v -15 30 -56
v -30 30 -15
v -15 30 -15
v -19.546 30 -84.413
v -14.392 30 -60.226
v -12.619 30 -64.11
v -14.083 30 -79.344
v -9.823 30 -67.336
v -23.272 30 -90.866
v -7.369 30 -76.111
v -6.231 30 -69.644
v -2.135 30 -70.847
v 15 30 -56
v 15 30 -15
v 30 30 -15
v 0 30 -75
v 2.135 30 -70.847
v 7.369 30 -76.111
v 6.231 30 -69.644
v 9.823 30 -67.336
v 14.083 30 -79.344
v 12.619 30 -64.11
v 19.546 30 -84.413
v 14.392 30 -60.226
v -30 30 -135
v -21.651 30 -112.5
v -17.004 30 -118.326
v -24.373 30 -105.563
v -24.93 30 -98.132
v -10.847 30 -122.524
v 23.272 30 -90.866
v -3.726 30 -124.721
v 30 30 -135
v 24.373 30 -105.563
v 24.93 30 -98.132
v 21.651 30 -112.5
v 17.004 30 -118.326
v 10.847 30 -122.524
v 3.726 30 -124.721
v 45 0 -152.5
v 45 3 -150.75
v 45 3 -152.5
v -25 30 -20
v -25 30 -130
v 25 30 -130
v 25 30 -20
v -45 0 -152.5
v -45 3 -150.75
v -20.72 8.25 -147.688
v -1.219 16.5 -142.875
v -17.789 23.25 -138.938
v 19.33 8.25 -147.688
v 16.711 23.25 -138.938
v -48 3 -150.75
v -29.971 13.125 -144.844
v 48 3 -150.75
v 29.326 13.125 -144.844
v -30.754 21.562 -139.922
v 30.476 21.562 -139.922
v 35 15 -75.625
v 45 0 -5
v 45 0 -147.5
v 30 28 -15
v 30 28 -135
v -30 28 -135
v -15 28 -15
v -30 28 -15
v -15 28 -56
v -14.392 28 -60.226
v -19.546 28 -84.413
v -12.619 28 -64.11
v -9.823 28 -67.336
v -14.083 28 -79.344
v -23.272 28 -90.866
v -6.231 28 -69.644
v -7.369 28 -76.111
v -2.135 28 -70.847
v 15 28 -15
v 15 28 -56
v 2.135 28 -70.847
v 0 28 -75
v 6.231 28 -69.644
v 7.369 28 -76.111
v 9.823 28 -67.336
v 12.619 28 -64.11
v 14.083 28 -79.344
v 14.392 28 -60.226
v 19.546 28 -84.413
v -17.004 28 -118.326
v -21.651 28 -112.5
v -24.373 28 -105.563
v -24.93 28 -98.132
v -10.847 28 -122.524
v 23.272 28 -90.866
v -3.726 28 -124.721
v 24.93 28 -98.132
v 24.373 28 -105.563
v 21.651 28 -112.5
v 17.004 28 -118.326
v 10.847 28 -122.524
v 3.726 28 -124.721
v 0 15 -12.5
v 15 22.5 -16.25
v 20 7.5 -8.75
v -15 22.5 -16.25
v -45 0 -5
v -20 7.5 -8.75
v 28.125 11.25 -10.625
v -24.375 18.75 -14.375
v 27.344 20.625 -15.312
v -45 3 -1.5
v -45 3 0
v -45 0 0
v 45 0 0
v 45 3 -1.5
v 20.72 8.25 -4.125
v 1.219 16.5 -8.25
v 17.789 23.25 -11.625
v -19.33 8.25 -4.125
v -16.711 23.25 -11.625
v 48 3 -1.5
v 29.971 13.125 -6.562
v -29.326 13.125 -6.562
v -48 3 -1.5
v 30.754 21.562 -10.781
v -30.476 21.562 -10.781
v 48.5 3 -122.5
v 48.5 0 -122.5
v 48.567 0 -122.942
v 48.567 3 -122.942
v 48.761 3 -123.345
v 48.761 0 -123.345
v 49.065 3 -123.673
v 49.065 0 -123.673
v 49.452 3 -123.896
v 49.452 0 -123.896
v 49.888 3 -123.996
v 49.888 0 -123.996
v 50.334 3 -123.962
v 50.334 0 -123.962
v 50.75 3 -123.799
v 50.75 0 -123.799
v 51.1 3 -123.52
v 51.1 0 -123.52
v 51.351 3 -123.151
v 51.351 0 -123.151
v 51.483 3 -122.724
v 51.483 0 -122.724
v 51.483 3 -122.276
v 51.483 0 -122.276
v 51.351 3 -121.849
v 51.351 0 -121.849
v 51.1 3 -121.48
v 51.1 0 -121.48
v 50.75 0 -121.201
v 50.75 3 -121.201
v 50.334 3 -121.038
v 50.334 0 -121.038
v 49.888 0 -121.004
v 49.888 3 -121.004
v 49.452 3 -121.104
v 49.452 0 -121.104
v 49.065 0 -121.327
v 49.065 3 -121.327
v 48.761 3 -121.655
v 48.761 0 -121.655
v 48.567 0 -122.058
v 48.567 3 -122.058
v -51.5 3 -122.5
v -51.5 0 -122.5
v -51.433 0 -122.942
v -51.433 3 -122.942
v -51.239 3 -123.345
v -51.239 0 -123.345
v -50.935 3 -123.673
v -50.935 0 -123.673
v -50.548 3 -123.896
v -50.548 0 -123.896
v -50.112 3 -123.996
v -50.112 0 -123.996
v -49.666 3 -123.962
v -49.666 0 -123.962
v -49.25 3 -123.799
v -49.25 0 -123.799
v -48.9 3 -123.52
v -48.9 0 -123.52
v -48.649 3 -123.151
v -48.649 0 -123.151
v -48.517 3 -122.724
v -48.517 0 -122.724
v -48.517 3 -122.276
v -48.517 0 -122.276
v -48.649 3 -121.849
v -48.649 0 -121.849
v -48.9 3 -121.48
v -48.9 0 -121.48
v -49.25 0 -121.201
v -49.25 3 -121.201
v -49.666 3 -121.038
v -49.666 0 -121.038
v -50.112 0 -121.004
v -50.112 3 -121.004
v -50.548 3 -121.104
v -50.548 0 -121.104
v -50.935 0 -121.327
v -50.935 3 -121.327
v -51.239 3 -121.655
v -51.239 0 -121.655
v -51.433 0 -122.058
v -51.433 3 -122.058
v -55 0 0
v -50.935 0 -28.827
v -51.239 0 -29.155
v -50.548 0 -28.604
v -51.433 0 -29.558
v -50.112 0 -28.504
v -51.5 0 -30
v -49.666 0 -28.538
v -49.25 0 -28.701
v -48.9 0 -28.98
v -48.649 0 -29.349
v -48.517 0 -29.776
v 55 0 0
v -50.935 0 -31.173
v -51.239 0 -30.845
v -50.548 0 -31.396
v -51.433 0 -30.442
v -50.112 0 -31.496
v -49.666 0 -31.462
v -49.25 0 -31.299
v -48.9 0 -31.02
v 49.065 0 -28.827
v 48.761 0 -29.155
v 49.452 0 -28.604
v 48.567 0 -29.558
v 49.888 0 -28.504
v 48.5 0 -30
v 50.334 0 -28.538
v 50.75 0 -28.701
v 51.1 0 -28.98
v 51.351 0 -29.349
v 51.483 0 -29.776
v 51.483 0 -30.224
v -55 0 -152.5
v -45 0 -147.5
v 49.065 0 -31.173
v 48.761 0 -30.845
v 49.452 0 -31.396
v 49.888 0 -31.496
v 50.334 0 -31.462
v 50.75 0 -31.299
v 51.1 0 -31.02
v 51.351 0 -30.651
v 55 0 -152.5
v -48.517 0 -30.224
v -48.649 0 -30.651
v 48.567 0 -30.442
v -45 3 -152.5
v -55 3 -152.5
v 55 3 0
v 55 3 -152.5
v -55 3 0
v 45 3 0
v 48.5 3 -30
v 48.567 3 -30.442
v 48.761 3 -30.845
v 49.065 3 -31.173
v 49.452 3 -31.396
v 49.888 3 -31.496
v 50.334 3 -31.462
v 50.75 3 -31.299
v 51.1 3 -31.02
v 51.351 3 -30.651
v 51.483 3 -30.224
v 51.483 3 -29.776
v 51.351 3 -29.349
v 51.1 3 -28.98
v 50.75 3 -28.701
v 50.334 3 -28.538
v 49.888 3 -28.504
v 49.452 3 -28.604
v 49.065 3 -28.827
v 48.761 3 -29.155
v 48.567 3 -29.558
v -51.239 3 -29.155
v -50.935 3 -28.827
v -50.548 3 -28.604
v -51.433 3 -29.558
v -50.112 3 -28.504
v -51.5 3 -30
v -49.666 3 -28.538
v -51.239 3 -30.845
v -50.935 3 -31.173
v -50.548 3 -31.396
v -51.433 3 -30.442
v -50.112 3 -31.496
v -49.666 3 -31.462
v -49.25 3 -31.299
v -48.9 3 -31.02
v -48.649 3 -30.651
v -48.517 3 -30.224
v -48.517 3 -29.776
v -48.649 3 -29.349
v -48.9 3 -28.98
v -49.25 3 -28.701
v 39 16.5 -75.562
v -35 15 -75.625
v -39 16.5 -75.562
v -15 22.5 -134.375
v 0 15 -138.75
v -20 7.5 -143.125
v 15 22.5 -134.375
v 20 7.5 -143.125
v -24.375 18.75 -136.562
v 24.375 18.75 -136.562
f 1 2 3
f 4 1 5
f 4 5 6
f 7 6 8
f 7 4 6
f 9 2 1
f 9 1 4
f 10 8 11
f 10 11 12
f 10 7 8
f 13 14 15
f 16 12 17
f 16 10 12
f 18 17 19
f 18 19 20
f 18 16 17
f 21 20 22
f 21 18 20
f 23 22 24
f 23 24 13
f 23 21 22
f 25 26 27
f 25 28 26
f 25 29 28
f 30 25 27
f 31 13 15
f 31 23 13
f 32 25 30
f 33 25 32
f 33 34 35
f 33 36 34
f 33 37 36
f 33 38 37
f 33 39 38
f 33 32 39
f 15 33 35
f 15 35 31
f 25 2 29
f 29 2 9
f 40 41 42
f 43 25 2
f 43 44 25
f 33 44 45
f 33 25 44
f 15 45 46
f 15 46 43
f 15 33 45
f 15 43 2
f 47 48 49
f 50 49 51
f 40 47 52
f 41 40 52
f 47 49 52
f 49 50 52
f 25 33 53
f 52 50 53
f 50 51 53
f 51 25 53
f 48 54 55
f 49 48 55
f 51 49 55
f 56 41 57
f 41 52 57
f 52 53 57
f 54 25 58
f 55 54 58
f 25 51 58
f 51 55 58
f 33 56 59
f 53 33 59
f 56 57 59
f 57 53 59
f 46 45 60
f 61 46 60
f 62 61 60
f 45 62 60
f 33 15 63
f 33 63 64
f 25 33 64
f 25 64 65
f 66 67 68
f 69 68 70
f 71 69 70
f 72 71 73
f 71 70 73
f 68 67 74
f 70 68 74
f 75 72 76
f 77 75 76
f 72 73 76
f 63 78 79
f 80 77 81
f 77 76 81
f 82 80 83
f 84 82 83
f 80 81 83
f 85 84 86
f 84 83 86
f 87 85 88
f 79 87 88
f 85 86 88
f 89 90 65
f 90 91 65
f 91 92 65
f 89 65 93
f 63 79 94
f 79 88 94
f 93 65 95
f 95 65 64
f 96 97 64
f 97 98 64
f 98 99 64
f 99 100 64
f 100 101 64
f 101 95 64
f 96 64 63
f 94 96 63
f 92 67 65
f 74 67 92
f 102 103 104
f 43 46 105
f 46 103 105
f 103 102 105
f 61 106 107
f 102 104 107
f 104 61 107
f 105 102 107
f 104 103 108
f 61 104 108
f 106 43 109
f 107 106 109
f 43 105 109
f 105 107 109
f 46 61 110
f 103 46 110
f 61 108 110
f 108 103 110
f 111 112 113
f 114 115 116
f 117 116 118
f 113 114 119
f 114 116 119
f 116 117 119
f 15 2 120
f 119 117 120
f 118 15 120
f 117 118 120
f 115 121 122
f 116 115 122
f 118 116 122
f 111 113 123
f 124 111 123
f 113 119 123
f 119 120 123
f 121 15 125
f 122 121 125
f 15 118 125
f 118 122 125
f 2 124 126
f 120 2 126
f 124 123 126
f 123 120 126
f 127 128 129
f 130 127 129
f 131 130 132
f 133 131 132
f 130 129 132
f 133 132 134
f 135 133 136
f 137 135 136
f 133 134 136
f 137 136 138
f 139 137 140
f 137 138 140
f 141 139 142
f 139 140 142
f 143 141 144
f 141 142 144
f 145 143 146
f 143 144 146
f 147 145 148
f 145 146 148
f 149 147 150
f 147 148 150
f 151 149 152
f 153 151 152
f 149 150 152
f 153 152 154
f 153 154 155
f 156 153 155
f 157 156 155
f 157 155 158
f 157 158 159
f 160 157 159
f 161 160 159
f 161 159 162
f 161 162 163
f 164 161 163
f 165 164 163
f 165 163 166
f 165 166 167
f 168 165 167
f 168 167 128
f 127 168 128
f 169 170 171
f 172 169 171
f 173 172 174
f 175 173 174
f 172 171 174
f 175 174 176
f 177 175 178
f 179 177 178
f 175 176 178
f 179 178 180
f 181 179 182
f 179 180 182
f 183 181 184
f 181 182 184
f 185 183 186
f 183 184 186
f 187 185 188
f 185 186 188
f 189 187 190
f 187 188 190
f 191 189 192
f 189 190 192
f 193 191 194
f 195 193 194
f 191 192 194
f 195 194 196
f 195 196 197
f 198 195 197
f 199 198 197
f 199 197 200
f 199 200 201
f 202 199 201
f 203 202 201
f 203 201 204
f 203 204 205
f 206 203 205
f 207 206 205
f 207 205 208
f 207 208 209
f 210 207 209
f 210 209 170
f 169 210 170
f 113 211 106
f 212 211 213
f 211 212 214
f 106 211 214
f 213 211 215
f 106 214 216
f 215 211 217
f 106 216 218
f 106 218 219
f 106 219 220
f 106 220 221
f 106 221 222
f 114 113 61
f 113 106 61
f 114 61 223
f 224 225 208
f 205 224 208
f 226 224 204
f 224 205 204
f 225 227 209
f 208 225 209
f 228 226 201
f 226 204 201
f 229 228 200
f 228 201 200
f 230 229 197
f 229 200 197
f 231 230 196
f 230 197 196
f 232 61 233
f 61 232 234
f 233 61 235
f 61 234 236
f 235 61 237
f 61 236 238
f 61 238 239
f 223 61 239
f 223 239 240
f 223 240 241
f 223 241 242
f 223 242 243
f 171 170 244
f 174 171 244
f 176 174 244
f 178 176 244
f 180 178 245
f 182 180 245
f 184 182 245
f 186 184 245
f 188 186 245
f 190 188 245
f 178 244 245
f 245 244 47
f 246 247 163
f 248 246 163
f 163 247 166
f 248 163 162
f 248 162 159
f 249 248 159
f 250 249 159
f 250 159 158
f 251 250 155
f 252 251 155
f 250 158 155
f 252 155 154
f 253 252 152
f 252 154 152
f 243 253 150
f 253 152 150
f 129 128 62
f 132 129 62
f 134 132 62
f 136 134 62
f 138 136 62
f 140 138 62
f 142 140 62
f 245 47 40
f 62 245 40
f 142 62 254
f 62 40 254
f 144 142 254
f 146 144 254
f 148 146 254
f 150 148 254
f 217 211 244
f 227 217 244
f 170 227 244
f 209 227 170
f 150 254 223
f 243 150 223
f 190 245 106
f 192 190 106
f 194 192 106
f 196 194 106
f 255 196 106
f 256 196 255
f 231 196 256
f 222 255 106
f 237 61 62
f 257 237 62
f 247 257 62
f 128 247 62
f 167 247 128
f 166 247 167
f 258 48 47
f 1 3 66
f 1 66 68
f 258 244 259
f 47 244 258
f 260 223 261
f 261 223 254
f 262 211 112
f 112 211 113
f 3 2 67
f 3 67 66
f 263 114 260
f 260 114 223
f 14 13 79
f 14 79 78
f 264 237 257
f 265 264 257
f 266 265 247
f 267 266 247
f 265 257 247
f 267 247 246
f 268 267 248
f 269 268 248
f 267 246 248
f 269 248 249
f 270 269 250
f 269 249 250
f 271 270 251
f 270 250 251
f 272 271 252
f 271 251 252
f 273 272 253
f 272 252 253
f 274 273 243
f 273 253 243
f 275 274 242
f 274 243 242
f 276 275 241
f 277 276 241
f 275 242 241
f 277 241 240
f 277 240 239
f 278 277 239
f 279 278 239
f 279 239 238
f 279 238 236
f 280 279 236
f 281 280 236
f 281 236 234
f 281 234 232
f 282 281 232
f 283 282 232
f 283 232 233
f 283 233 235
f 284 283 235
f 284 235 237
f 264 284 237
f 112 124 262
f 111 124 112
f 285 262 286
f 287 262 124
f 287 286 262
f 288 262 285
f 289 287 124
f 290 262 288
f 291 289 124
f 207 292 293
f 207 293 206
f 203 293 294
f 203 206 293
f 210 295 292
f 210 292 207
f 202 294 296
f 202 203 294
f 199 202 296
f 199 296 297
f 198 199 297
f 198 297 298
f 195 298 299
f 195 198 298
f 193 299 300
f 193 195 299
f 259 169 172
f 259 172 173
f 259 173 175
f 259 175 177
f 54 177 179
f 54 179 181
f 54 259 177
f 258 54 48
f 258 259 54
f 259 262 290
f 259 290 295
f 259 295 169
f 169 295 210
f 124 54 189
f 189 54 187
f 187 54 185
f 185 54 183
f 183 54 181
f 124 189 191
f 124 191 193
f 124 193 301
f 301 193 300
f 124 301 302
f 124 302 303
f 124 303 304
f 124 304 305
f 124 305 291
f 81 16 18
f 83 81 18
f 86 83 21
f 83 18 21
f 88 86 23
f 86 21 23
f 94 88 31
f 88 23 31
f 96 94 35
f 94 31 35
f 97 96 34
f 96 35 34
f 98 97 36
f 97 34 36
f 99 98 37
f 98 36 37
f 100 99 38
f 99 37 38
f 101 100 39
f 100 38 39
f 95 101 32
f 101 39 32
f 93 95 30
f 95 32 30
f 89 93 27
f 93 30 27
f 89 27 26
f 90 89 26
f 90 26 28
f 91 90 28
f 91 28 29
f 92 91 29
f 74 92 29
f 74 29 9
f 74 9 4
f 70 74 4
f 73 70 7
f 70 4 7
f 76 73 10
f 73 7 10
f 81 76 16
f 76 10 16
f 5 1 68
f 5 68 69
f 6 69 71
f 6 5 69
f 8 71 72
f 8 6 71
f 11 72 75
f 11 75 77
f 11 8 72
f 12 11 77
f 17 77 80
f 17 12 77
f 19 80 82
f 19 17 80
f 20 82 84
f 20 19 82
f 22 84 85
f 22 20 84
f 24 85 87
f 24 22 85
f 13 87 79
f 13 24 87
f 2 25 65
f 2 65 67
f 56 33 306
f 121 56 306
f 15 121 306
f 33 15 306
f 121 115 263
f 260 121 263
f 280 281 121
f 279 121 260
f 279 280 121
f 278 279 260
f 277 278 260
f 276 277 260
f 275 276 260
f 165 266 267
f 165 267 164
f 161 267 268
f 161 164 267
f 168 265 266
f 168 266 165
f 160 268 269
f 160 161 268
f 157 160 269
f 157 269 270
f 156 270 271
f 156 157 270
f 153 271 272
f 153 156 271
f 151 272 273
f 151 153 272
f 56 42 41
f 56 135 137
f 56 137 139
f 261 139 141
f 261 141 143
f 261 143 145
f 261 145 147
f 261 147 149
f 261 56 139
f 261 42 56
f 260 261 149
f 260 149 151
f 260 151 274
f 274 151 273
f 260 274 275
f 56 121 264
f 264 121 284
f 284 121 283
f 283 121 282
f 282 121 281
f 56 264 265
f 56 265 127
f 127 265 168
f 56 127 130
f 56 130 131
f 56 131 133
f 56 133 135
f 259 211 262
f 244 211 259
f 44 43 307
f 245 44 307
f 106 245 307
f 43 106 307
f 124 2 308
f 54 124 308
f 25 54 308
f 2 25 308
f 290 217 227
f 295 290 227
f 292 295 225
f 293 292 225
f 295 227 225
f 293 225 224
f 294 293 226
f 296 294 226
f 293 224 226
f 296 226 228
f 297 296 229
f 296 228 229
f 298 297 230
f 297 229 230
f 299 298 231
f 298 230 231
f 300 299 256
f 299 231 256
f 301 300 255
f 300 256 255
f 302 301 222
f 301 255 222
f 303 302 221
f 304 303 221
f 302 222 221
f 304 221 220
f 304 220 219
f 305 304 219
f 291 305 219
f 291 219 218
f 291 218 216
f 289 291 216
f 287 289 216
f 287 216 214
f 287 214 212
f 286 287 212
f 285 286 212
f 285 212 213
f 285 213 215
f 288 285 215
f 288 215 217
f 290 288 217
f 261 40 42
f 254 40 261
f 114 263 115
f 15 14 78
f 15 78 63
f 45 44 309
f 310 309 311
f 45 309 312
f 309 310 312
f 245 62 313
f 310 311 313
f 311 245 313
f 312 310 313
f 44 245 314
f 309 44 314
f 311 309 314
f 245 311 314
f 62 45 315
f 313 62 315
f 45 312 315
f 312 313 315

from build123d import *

# Parameters (mm, degrees)
SKETCH6_W             = 10
SKETCH6_H             = 152.5
BOSS_EXTRUDE2_DEPTH   = 3
F_3_0MM_DOWEL_HOLE1_D = 3
SKETCH12_R            = 25
BOSS_EXTRUDE3_DEPTH   = 2


with BuildPart() as part:
    # Sketch1 → Loft8 section 0
    with BuildSketch(Plane(origin=(0, 0, 0), x_dir=(1, 0, 0), z_dir=(0, 1, 0))):
        with BuildLine():
            Line((-50, 152.5), (50, 152.5))
            Line((50, 152.5), (50, 0))
            Line((50, 0), (-50, 0))
            Line((-50, 0), (-50, 152.5))
        make_face()
    # Sketch3 → Loft8 section 1
    with BuildSketch(Plane(origin=(0, 30, 0), x_dir=(1, 0, 0), z_dir=(0, 1, 0))):
        with BuildLine():
            Line((-30, 135), (30, 135))
            Line((30, 135), (30, 15))
            Line((30, 15), (-30, 15))
            Line((-30, 15), (-30, 135))
        make_face()
    loft()

    # Sketch4 → Cut-Loft1 section 0
    with BuildSketch(Plane(origin=(0, 30, 0), x_dir=(1, 0, 0), z_dir=(0, 1, 0))):
        with BuildLine():
            Line((-25, 130), (25, 130))
            Line((25, 130), (25, 20))
            Line((25, 20), (-25, 20))
            Line((-25, 20), (-25, 130))
        make_face()
    # Sketch5 → Cut-Loft1 section 1
    with BuildSketch(Plane(origin=(0, 0, 0), x_dir=(1, 0, 0), z_dir=(0, 1, 0))):
        with BuildLine():
            Line((-45, 147.5), (45, 147.5))
            Line((45, 147.5), (45, 5))
            Line((45, 5), (-45, 5))
            Line((-45, 5), (-45, 147.5))
        make_face()
    loft(mode=Mode.SUBTRACT)

    # Sketch6 → Boss-Extrude2 (add)
    with BuildSketch(Plane(origin=(0, 0, 0), x_dir=(1, 0, 0), z_dir=(0, 1, 0))):
        with Locations((-50, 76.25)):
            Rectangle(SKETCH6_W, SKETCH6_H)
        with Locations((50, 76.25)):
            Rectangle(SKETCH6_W, SKETCH6_H)
    extrude(amount=BOSS_EXTRUDE2_DEPTH)

    # Ø3.0mm Dowel Hole1 (through all)
    with Locations(Plane(origin=(0, 3, 0), x_dir=(1, 0, 0), z_dir=(0, 1, 0))):
        with Locations((50, 30), (-50, 30), (-50, 122.5), (50, 122.5)):
            Hole(F_3_0MM_DOWEL_HOLE1_D / 2)


with BuildPart() as body_2:
    # Sketch12 → Boss-Extrude3 (new body)
    with BuildSketch(Plane(origin=(0, 30, 0), x_dir=(1, 0, 0), z_dir=(0, 1, 0))):
        with BuildLine():
            Line((-15, 15), (-15, 56))
            ThreePointArc((-15, 56), (0, 71), (15, 56))
            Line((15, 56), (15, 15))
            Line((15, 15), (30, 15))
            Line((30, 15), (30, 135))
            Line((30, 135), (-30, 135))
            Line((-30, 135), (-30, 15))
            Line((-30, 15), (-15, 15))
        make_face()
        with Locations(Location((0, 100, 0), (0, 0, 270))):
            Circle(SKETCH12_R, mode=Mode.SUBTRACT)
    extrude(amount=-BOSS_EXTRUDE3_DEPTH)


solid = Compound([part.part, body_2.part])
